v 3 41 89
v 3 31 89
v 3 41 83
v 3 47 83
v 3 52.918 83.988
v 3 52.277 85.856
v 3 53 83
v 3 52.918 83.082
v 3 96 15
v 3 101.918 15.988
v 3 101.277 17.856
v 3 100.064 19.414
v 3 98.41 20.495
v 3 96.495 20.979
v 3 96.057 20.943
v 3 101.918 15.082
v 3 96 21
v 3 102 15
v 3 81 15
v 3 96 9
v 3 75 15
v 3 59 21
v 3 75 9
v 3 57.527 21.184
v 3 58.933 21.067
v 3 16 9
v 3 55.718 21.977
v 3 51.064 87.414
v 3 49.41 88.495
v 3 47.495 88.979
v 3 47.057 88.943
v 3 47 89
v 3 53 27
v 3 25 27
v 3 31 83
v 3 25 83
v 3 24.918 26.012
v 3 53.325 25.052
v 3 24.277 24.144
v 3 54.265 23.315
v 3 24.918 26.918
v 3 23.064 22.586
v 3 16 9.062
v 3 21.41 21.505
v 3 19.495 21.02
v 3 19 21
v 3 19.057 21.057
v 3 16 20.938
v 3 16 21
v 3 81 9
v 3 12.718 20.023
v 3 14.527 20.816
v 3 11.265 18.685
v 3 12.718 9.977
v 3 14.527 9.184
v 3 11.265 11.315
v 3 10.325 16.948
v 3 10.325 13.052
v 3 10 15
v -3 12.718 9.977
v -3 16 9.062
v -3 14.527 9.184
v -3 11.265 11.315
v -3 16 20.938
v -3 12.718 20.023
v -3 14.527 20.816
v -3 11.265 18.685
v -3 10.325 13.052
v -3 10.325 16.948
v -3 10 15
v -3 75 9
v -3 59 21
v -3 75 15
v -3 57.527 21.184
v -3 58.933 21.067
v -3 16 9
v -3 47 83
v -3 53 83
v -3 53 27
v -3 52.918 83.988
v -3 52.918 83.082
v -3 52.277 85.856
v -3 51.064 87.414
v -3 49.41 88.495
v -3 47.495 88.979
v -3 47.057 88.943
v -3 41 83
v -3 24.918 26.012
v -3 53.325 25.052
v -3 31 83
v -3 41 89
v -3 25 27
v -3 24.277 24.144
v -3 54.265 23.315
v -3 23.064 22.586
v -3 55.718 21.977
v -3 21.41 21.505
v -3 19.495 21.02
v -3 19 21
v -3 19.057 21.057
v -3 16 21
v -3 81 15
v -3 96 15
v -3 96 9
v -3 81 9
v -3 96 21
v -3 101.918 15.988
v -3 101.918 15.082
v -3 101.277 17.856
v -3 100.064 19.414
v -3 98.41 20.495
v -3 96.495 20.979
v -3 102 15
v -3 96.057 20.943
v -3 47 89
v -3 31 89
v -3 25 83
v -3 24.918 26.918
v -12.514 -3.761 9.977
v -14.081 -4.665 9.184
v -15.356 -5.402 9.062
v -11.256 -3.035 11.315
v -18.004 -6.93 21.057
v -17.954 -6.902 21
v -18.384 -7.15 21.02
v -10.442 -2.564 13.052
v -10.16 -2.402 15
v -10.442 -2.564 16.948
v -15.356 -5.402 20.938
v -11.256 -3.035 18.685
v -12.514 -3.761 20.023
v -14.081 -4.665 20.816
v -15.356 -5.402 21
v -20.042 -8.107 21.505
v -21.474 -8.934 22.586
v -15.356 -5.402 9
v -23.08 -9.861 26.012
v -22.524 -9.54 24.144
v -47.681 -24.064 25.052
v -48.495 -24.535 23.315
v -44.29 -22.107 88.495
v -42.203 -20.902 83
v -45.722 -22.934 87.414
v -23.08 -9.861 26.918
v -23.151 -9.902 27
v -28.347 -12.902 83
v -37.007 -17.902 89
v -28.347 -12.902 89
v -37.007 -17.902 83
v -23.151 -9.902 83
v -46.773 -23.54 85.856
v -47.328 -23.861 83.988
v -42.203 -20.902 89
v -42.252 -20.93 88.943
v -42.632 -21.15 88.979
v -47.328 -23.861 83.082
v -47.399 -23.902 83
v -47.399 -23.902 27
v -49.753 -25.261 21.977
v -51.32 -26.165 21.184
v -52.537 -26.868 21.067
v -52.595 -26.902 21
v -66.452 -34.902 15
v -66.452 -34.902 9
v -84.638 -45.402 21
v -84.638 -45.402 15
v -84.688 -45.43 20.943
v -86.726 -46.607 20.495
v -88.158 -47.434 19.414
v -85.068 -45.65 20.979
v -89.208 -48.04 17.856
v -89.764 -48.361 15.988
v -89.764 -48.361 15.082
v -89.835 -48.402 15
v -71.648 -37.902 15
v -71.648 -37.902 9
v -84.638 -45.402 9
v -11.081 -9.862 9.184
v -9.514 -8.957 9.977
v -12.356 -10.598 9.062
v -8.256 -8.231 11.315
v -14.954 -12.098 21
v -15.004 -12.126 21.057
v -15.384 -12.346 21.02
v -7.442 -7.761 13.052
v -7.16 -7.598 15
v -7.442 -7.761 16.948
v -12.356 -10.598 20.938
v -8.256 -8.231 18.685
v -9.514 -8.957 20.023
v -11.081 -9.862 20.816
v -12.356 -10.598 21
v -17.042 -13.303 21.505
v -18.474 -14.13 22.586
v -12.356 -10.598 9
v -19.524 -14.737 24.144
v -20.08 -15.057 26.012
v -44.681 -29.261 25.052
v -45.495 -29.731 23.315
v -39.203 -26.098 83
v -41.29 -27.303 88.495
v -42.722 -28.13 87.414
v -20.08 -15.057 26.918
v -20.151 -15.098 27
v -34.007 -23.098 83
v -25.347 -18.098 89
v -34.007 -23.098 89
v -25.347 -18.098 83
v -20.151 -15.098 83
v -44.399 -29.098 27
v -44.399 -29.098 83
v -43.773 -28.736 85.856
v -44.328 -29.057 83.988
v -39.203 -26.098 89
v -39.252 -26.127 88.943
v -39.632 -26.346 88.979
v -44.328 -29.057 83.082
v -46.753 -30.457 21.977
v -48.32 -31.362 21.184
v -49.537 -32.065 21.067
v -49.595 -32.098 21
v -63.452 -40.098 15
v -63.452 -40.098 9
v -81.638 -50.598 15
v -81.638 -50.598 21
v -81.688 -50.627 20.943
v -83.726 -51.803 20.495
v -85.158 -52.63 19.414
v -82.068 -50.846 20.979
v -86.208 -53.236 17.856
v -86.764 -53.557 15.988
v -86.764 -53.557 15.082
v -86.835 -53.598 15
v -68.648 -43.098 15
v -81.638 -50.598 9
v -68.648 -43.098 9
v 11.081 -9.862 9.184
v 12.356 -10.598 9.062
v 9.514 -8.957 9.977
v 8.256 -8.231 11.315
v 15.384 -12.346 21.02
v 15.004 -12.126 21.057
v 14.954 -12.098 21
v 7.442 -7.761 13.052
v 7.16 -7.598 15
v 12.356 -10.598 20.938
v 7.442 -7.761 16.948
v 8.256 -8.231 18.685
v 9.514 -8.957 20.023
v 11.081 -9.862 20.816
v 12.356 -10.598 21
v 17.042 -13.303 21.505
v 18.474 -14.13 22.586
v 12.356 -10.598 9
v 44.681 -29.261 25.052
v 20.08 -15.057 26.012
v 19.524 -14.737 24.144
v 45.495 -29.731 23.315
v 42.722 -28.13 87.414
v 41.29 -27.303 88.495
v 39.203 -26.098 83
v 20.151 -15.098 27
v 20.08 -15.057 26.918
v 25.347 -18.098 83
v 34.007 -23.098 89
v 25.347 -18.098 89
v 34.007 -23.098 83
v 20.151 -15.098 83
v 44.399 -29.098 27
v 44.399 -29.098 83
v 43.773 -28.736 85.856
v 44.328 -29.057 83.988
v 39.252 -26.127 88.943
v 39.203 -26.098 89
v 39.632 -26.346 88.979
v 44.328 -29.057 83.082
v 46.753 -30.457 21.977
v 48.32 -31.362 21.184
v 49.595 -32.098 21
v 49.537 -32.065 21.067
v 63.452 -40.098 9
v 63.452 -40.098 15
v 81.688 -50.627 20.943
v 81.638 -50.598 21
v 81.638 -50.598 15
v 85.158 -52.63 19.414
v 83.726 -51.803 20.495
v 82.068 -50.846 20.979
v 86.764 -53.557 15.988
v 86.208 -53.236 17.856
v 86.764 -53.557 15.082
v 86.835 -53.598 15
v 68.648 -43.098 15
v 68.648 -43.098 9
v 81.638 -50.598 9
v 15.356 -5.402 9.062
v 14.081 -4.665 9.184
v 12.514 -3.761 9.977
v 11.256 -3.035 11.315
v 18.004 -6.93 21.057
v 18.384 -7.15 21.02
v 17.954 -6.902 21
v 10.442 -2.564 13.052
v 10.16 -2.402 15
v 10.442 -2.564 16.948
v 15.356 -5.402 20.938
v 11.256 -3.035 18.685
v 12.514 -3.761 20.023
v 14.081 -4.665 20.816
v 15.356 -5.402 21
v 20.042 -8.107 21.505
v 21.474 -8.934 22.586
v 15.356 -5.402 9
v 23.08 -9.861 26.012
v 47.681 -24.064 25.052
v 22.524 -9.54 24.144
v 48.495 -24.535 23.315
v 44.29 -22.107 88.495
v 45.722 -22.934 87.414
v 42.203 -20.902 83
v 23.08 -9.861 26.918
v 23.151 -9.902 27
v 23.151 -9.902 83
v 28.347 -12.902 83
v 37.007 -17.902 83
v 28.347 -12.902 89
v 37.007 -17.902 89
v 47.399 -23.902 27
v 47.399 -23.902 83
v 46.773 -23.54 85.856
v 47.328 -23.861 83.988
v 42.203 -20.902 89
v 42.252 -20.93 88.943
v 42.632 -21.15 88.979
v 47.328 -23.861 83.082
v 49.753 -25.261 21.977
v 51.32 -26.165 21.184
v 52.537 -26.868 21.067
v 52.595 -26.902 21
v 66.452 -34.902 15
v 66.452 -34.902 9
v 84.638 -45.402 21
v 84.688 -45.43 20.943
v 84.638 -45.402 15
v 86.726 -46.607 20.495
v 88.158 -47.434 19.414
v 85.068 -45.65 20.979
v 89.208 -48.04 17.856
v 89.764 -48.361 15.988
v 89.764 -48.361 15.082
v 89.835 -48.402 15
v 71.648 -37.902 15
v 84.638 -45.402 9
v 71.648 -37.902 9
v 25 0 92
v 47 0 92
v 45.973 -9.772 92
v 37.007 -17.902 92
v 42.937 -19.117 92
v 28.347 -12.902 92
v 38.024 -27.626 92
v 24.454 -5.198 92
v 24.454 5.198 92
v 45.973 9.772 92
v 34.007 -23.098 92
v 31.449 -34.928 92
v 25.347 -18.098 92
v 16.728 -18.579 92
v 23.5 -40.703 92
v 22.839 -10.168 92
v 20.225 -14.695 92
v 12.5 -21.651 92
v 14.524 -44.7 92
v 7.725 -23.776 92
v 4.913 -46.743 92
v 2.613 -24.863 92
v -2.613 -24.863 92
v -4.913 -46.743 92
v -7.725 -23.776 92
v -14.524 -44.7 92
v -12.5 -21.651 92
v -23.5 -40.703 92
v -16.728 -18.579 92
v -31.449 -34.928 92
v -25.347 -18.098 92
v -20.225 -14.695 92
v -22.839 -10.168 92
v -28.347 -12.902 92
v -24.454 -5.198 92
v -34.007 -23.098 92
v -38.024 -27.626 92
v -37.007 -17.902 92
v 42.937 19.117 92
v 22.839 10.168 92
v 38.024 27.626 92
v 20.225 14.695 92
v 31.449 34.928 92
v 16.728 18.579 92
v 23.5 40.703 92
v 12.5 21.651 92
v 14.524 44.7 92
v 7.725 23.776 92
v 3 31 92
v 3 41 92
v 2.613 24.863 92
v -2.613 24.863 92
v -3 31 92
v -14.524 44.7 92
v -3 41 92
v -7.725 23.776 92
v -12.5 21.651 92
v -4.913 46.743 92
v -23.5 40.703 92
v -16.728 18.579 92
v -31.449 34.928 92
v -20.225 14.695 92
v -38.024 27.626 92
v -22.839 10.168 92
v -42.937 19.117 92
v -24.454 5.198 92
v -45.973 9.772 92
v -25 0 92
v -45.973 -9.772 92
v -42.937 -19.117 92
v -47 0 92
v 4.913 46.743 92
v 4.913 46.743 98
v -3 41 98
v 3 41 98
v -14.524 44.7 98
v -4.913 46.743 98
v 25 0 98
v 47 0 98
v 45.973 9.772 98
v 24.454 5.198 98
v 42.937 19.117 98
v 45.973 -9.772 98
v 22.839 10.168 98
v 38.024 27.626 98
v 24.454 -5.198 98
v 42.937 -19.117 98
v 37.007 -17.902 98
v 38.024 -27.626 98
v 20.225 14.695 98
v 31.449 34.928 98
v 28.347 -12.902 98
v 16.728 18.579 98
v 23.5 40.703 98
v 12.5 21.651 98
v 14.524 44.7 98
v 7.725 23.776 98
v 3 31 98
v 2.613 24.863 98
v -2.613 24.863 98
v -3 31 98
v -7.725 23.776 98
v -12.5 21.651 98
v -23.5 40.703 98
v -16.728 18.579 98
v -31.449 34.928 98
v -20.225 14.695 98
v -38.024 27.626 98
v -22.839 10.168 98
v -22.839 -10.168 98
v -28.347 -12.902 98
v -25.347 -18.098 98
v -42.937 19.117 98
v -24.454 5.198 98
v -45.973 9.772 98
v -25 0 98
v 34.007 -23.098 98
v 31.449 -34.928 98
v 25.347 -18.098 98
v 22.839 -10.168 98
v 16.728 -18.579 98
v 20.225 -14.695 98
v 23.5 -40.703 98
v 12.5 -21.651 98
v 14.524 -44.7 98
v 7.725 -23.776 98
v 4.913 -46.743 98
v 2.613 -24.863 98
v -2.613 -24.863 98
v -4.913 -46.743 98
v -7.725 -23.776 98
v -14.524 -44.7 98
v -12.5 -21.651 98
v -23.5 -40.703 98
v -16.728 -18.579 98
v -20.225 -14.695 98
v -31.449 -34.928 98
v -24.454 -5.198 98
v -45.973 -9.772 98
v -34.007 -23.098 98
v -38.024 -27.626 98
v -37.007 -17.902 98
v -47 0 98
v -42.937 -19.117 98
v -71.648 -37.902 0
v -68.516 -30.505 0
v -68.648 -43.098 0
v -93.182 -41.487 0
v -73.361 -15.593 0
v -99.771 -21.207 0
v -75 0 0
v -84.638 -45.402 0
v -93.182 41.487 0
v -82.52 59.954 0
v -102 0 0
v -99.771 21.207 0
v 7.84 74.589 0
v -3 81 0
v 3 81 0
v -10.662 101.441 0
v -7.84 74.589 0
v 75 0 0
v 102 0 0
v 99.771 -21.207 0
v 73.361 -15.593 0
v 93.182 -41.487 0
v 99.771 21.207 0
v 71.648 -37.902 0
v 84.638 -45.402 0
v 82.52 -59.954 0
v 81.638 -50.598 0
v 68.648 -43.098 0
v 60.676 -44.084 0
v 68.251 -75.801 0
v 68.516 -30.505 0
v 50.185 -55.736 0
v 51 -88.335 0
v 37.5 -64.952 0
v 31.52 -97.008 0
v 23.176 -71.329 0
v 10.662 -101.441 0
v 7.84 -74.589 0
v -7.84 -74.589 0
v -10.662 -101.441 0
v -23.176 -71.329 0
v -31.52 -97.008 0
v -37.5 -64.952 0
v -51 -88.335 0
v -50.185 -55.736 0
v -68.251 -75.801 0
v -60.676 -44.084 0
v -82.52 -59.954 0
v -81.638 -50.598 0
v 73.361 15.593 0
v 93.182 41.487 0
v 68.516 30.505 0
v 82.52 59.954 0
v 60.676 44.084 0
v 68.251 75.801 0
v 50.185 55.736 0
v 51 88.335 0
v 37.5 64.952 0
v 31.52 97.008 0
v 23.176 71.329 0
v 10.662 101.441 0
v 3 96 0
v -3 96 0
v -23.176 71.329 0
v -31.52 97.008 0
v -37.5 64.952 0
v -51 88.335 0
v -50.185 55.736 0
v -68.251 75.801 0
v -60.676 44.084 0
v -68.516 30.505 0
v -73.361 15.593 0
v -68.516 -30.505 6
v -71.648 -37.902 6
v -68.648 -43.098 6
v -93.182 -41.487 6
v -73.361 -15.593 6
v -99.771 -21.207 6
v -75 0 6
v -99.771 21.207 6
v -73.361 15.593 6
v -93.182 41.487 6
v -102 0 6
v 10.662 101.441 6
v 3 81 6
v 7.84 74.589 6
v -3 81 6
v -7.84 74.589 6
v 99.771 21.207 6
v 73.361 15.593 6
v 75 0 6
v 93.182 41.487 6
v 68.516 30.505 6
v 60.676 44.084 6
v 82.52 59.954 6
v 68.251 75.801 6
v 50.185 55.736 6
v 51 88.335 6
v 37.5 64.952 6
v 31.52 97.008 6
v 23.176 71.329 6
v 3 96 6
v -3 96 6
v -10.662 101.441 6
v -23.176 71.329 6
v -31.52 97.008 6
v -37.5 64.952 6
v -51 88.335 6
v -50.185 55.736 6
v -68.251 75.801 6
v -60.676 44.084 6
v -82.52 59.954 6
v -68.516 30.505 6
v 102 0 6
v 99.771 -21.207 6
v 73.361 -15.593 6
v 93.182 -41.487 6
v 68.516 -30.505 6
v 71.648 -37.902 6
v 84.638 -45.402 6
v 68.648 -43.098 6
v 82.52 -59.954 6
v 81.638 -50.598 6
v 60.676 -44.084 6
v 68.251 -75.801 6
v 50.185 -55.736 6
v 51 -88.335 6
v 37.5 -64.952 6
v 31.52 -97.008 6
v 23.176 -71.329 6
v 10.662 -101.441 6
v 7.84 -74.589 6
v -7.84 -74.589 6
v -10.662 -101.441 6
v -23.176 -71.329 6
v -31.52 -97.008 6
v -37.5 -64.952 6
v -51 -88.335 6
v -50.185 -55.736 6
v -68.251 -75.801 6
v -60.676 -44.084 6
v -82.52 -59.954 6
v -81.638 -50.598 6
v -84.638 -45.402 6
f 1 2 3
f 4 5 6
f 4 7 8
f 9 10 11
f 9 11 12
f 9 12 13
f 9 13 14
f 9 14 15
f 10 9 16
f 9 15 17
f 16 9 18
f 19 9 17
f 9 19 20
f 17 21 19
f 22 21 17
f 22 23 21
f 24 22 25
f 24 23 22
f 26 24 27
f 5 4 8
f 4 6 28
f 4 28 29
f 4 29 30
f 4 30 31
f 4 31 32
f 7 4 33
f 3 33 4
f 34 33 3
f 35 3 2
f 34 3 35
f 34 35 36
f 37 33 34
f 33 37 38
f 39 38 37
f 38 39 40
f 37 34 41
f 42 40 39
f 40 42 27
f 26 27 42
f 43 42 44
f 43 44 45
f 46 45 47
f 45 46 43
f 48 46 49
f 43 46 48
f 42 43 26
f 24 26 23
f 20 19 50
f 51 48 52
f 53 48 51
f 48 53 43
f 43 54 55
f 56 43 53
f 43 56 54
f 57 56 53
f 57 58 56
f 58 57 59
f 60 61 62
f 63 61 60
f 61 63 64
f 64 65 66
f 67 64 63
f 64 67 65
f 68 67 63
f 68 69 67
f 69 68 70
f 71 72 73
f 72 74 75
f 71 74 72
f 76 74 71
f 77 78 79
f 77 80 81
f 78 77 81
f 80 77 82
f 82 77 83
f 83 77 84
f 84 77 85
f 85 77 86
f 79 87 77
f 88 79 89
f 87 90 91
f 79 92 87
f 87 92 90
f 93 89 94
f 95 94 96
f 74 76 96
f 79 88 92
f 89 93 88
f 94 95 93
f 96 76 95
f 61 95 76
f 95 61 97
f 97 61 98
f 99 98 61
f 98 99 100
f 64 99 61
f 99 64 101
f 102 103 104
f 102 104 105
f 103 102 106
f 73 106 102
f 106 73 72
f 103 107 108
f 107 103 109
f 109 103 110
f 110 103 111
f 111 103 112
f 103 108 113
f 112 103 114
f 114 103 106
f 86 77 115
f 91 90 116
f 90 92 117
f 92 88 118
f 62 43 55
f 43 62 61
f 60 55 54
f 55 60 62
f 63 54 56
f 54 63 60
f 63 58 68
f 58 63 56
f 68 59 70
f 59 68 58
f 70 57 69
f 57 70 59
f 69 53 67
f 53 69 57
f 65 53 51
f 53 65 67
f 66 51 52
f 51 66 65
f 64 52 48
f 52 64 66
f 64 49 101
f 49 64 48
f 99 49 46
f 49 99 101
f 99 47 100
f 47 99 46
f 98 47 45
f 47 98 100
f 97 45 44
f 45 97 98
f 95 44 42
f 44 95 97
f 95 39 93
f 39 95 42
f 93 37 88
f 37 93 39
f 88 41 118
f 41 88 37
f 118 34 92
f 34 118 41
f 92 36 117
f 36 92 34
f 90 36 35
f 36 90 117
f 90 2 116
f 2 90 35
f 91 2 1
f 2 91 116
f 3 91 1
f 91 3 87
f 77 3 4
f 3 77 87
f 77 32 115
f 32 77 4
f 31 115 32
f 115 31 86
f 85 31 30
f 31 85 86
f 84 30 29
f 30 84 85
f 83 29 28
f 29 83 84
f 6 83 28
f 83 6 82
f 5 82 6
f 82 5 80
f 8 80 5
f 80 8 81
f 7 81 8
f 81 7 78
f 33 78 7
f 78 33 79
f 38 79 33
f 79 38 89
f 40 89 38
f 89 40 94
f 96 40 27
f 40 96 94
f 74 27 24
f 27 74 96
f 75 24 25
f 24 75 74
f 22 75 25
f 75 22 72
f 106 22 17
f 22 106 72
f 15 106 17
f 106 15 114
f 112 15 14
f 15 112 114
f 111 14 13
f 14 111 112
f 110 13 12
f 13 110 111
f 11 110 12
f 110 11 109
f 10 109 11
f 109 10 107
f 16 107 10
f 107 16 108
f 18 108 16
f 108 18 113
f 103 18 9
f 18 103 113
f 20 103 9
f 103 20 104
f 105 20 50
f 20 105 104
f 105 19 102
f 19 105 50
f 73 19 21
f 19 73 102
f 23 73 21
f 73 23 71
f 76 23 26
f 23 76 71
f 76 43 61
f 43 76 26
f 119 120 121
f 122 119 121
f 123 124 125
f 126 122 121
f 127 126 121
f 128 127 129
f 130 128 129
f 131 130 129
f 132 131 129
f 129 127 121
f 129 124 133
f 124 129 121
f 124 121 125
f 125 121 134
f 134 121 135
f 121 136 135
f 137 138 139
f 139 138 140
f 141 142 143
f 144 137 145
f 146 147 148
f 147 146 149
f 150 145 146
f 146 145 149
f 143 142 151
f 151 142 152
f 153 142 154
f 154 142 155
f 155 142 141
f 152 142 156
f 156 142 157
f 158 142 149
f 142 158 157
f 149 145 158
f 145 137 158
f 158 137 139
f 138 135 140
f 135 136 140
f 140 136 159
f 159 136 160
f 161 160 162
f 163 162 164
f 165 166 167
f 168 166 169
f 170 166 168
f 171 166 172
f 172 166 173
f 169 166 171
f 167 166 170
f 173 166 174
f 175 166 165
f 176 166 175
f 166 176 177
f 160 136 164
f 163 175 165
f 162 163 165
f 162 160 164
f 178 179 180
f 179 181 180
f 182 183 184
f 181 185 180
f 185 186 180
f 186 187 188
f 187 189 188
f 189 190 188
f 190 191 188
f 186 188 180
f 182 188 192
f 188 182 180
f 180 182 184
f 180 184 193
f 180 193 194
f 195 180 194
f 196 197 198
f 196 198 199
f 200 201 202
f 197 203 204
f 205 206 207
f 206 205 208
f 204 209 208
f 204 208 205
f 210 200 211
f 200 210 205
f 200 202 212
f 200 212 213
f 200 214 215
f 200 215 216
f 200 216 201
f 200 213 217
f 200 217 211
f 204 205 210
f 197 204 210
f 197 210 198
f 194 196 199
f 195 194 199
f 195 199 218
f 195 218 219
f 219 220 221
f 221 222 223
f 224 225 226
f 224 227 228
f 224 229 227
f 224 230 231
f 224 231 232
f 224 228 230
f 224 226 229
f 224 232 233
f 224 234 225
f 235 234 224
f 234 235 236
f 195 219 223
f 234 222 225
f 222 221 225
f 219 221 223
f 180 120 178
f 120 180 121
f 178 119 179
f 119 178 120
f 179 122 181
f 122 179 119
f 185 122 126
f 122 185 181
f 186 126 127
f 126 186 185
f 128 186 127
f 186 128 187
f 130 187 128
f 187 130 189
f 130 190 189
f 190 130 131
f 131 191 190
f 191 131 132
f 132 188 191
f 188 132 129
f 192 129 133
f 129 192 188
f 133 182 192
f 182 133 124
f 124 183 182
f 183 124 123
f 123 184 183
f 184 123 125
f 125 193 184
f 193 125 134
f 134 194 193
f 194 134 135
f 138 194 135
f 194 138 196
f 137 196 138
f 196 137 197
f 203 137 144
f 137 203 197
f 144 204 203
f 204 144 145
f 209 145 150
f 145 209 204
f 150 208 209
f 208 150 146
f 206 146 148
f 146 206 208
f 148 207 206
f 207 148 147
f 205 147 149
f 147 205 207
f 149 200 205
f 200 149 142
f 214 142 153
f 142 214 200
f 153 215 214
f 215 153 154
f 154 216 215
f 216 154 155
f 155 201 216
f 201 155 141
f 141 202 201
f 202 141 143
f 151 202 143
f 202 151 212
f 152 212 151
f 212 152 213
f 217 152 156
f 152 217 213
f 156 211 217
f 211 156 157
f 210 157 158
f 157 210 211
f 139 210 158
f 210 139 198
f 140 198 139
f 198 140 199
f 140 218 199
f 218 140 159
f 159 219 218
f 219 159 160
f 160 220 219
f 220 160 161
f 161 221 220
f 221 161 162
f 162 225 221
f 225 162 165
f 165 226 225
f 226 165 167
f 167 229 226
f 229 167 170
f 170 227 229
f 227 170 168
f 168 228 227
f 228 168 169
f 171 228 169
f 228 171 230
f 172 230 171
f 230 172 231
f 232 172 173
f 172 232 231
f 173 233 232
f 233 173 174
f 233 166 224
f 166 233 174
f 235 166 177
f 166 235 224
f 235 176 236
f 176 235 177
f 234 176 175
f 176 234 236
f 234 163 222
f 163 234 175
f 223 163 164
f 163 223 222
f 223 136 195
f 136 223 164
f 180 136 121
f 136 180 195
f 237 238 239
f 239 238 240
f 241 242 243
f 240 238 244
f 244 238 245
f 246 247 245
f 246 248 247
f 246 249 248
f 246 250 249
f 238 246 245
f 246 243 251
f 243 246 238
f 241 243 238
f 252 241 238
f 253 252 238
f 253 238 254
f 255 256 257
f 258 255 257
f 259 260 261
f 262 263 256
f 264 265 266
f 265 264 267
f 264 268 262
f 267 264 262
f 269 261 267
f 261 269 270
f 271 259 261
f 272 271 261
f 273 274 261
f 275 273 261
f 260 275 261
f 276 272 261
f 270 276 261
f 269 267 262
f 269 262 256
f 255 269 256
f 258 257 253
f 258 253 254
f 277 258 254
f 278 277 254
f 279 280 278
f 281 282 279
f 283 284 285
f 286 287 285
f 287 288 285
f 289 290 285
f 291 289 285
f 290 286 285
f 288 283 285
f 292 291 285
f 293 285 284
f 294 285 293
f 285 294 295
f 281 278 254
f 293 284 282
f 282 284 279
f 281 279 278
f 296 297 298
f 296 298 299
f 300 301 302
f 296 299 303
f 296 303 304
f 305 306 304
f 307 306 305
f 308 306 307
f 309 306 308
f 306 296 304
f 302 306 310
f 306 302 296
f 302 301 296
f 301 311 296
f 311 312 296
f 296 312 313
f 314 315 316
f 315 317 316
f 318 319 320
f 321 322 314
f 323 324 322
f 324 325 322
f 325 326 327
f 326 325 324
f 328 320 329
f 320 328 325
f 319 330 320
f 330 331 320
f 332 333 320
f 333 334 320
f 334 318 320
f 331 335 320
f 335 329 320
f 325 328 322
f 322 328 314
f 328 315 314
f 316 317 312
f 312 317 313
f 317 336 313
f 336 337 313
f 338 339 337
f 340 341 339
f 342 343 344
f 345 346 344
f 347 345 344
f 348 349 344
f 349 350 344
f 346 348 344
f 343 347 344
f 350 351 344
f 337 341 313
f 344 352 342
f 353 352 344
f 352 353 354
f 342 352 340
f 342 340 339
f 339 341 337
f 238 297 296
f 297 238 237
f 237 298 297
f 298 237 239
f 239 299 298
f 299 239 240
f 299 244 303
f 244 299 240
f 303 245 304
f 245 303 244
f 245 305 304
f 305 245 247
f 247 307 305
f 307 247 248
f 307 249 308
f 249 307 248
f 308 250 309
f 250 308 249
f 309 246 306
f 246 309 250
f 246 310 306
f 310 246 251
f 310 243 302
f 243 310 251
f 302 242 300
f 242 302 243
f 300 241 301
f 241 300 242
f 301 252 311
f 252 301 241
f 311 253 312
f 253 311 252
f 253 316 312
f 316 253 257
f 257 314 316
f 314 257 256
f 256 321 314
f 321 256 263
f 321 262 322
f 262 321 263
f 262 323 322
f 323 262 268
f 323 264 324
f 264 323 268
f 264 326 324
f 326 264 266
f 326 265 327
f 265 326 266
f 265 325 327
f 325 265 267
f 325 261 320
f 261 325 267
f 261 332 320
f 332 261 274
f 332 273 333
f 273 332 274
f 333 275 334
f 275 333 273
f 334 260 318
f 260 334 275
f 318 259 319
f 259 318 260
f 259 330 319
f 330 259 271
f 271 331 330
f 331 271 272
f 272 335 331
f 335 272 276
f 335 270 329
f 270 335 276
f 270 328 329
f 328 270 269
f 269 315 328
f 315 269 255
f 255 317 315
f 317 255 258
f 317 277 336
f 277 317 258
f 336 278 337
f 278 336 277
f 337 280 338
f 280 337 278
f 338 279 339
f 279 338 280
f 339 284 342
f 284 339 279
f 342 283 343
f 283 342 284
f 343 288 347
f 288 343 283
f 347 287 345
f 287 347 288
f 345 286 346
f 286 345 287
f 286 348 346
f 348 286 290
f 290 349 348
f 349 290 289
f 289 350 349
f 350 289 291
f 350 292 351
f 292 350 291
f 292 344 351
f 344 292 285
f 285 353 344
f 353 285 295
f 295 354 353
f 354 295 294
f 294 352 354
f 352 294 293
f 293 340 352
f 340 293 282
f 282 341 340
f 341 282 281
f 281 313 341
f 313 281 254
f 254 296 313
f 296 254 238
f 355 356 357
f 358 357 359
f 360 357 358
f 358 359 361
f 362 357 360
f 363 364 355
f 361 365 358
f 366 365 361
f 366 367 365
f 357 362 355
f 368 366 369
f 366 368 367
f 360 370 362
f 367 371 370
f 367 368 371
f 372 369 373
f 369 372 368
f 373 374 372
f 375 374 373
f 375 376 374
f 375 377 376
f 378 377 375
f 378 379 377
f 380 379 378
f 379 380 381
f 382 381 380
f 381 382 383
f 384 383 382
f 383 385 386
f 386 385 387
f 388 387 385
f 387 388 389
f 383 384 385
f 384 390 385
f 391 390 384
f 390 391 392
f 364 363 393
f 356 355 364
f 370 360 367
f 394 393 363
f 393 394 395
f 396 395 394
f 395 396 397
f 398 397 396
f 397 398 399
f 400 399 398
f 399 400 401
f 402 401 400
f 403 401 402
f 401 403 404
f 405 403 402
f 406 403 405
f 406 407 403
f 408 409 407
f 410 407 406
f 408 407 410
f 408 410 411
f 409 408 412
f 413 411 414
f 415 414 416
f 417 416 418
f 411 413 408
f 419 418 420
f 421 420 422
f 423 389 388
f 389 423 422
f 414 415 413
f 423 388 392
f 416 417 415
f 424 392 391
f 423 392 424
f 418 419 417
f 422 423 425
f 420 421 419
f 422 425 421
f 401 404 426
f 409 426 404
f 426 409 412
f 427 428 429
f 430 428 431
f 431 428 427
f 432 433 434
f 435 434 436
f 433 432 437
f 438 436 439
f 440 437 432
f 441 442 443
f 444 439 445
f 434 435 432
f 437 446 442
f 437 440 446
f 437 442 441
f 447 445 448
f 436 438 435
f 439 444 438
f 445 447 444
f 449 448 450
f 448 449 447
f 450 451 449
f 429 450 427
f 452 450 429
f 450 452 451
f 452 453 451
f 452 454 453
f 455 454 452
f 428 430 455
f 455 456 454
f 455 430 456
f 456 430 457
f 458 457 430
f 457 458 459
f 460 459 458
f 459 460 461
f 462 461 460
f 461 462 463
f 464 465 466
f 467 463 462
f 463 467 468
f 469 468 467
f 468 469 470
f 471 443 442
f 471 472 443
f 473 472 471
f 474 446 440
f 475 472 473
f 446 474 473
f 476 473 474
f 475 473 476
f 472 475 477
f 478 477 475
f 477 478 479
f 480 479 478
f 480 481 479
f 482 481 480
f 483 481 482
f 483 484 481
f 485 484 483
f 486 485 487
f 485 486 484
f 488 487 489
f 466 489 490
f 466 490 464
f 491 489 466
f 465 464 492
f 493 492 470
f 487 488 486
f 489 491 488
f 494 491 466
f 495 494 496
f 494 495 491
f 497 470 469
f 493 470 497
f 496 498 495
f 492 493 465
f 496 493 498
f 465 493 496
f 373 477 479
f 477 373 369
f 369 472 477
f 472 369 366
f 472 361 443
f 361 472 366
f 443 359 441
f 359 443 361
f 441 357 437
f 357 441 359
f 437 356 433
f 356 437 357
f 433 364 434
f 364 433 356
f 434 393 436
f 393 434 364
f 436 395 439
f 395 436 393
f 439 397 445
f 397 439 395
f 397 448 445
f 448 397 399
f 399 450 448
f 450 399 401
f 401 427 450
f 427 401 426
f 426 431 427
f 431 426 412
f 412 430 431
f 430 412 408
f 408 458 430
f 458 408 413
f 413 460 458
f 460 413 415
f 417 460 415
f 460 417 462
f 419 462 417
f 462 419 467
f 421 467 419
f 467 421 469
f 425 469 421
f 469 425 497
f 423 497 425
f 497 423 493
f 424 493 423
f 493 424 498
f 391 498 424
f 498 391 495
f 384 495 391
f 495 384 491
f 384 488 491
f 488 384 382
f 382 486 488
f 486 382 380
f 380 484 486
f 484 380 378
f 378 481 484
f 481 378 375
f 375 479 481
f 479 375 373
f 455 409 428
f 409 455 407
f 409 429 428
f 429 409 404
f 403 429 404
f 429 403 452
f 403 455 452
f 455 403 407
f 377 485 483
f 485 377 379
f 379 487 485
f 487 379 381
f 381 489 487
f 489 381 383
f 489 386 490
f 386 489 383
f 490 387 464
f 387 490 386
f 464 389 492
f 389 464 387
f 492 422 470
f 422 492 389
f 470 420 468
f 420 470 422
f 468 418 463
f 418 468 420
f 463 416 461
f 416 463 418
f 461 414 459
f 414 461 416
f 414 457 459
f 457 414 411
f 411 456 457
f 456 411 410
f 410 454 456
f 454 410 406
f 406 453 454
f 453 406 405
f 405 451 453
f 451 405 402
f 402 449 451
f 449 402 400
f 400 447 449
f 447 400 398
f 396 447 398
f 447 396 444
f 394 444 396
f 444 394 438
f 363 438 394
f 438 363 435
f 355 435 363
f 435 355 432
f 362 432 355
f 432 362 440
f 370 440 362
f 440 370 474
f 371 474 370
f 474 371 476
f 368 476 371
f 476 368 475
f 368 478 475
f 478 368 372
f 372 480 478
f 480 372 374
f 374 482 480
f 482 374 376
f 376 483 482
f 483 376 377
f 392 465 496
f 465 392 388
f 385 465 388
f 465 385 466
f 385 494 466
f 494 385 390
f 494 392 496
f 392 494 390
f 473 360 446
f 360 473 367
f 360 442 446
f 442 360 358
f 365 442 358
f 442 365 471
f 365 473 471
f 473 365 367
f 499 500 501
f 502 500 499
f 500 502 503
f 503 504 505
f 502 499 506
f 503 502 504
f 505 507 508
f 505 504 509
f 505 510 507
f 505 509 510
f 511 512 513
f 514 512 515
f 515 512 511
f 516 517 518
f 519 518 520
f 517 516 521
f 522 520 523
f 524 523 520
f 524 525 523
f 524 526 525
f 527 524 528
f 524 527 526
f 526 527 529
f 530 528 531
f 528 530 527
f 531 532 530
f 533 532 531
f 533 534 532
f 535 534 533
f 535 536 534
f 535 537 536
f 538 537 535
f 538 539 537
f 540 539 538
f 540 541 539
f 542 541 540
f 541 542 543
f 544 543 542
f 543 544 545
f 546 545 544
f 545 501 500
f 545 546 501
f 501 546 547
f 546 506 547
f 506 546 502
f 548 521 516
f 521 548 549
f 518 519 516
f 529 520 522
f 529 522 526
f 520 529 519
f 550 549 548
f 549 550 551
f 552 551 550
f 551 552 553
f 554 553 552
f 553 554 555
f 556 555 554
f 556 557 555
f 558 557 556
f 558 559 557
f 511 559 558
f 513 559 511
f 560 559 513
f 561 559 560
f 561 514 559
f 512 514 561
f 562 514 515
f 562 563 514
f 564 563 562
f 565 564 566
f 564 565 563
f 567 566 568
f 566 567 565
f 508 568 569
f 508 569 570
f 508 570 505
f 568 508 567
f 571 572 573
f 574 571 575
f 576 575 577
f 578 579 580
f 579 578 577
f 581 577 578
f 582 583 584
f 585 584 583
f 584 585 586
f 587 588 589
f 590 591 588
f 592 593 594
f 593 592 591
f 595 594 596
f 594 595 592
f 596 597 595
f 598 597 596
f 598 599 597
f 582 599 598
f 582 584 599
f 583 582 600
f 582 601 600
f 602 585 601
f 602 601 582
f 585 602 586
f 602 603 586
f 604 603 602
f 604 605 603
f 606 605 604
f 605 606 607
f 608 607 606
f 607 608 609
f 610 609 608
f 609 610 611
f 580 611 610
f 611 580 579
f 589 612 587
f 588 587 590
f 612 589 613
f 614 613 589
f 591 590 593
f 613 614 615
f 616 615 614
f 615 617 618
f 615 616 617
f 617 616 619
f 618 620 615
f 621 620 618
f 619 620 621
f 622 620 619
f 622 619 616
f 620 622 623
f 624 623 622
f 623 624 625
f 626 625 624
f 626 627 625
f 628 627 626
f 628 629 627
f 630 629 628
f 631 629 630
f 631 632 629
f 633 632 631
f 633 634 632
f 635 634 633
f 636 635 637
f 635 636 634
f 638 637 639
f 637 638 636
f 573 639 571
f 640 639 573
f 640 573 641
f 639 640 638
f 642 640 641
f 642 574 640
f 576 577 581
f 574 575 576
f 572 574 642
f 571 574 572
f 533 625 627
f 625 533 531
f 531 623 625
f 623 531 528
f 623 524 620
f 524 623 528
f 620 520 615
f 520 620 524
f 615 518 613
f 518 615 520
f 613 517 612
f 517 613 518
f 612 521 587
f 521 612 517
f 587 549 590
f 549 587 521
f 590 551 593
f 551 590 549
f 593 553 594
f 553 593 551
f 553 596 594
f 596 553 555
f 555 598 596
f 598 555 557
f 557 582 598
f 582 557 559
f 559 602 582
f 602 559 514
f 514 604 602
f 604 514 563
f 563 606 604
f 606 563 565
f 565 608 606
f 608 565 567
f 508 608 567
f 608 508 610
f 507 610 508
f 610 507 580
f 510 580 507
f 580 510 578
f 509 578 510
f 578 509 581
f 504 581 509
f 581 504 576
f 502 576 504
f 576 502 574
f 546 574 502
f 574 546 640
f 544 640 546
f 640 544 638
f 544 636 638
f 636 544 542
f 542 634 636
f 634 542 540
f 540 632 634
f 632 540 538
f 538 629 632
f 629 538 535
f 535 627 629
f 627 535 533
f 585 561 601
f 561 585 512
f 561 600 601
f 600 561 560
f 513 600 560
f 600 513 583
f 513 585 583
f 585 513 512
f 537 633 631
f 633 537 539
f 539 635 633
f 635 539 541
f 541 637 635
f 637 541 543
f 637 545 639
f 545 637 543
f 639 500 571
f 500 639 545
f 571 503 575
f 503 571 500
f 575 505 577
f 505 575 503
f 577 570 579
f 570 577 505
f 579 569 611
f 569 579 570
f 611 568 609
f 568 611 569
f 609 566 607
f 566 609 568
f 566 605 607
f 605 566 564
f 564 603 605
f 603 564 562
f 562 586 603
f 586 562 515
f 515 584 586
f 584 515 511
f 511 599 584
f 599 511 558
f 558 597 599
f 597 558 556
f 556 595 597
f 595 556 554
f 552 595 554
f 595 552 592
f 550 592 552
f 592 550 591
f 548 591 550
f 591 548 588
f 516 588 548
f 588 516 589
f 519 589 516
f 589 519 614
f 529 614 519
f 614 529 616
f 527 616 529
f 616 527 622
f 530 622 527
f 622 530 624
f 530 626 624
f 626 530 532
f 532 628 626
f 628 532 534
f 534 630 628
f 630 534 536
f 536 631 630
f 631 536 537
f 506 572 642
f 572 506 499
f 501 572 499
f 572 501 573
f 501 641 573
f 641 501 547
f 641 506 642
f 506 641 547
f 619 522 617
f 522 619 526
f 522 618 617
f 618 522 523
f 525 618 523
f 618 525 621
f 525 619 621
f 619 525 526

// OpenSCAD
//created with rubyscad 1.0

translate(v = [0, 0, 92.000]) 
linear_extrude(height = 6.000, convexity = 4) 
difference() {
   circle(r = 47.000); 
   rotate(a = 0) 
   translate(v = [0, 36.000]) 
   square(size = [6.000, 10.000], center = true); 
   circle(r = 25.000); 
   rotate(a = 120) 
   translate(v = [0, 36.000]) 
   square(size = [6.000, 10.000], center = true); 
   circle(r = 25.000); 
   rotate(a = 240) 
   translate(v = [0, 36.000]) 
   square(size = [6.000, 10.000], center = true); 
   circle(r = 25.000); 
}
linear_extrude(height = 6.000, convexity = 4) 
difference() {
   circle(r = 102.000); 
   rotate(a = 0) 
   translate(v = [0, 88.500]) 
   square(size = [6.000, 15.000], center = true); 
   circle(r = 75.000); 
   rotate(a = 120) 
   translate(v = [0, 88.500]) 
   square(size = [6.000, 15.000], center = true); 
   circle(r = 75.000); 
   rotate(a = 240) 
   translate(v = [0, 88.500]) 
   square(size = [6.000, 15.000], center = true); 
   circle(r = 75.000); 
}
color(c = [0.700, 0.700, 1], color = [0, 0, 0, 1]) {
   rotate(a = 0) 
   translate(v = [0, 102.000, 9.000]) 
   rotate(a = [90, 0, -90]) 
   linear_extrude(height = 6.000, convexity = 10, center = true) 
   union() {
      difference() {
         polygon(points = [[0, 6.000], [6.000, 6.000], [6.000, 0], [21.000, 0], [21.000, 6.000], [27.000, 6.000], [27.000, 0], [77.000, 0], [83.000, 12.000], [77.000, 18.000], [77.000, 74.000], [71.000, 74.000], [71.000, 80.000], [61.000, 80.000], [61.000, 74.000], [55.000, 74.000], [55.000, 80.000], [49.000, 74.000], [49.000, 18.000], [43.000, 12.000], [6.000, 12.000]]); 
         translate(v = [43.000, 18.000]) 
         circle(r = 6.000); 
         translate(v = [83.000, 18.000]) 
         circle(r = 6.000); 
      }
      translate(v = [77.000, 0]) 
      square(size = [9.000, 12.000]); 
      translate(v = [86.000, 6.000]) 
      circle(r = 6.000); 
      translate(v = [6.000, 6.000]) 
      intersection() {
         circle(r = 6.000); 
         translate(v = [-12.000, 0]) 
         square(size = 12.000); 
      }
      translate(v = [55.000, 74.000]) 
      intersection() {
         circle(r = 6.000); 
         translate(v = [-12.000, 0]) 
         square(size = 12.000); 
      }
   }
   rotate(a = 120) 
   translate(v = [0, 102.000, 9.000]) 
   rotate(a = [90, 0, -90]) 
   linear_extrude(height = 6.000, convexity = 10, center = true) 
   union() {
      difference() {
         polygon(points = [[0, 6.000], [6.000, 6.000], [6.000, 0], [21.000, 0], [21.000, 6.000], [27.000, 6.000], [27.000, 0], [77.000, 0], [83.000, 12.000], [77.000, 18.000], [77.000, 74.000], [71.000, 74.000], [71.000, 80.000], [61.000, 80.000], [61.000, 74.000], [55.000, 74.000], [55.000, 80.000], [49.000, 74.000], [49.000, 18.000], [43.000, 12.000], [6.000, 12.000]]); 
         translate(v = [43.000, 18.000]) 
         circle(r = 6.000); 
         translate(v = [83.000, 18.000]) 
         circle(r = 6.000); 
      }
      translate(v = [77.000, 0]) 
      square(size = [9.000, 12.000]); 
      translate(v = [86.000, 6.000]) 
      circle(r = 6.000); 
      translate(v = [6.000, 6.000]) 
      intersection() {
         circle(r = 6.000); 
         translate(v = [-12.000, 0]) 
         square(size = 12.000); 
      }
      translate(v = [55.000, 74.000]) 
      intersection() {
         circle(r = 6.000); 
         translate(v = [-12.000, 0]) 
         square(size = 12.000); 
      }
   }
   rotate(a = 240) 
   translate(v = [0, 102.000, 9.000]) 
   rotate(a = [90, 0, -90]) 
   linear_extrude(height = 6.000, convexity = 10, center = true) 
   union() {
      difference() {
         polygon(points = [[0, 6.000], [6.000, 6.000], [6.000, 0], [21.000, 0], [21.000, 6.000], [27.000, 6.000], [27.000, 0], [77.000, 0], [83.000, 12.000], [77.000, 18.000], [77.000, 74.000], [71.000, 74.000], [71.000, 80.000], [61.000, 80.000], [61.000, 74.000], [55.000, 74.000], [55.000, 80.000], [49.000, 74.000], [49.000, 18.000], [43.000, 12.000], [6.000, 12.000]]); 
         translate(v = [43.000, 18.000]) 
         circle(r = 6.000); 
         translate(v = [83.000, 18.000]) 
         circle(r = 6.000); 
      }
      translate(v = [77.000, 0]) 
      square(size = [9.000, 12.000]); 
      translate(v = [86.000, 6.000]) 
      circle(r = 6.000); 
      translate(v = [6.000, 6.000]) 
      intersection() {
         circle(r = 6.000); 
         translate(v = [-12.000, 0]) 
         square(size = 12.000); 
      }
      translate(v = [55.000, 74.000]) 
      intersection() {
         circle(r = 6.000); 
         translate(v = [-12.000, 0]) 
         square(size = 12.000); 
      }
   }
}
